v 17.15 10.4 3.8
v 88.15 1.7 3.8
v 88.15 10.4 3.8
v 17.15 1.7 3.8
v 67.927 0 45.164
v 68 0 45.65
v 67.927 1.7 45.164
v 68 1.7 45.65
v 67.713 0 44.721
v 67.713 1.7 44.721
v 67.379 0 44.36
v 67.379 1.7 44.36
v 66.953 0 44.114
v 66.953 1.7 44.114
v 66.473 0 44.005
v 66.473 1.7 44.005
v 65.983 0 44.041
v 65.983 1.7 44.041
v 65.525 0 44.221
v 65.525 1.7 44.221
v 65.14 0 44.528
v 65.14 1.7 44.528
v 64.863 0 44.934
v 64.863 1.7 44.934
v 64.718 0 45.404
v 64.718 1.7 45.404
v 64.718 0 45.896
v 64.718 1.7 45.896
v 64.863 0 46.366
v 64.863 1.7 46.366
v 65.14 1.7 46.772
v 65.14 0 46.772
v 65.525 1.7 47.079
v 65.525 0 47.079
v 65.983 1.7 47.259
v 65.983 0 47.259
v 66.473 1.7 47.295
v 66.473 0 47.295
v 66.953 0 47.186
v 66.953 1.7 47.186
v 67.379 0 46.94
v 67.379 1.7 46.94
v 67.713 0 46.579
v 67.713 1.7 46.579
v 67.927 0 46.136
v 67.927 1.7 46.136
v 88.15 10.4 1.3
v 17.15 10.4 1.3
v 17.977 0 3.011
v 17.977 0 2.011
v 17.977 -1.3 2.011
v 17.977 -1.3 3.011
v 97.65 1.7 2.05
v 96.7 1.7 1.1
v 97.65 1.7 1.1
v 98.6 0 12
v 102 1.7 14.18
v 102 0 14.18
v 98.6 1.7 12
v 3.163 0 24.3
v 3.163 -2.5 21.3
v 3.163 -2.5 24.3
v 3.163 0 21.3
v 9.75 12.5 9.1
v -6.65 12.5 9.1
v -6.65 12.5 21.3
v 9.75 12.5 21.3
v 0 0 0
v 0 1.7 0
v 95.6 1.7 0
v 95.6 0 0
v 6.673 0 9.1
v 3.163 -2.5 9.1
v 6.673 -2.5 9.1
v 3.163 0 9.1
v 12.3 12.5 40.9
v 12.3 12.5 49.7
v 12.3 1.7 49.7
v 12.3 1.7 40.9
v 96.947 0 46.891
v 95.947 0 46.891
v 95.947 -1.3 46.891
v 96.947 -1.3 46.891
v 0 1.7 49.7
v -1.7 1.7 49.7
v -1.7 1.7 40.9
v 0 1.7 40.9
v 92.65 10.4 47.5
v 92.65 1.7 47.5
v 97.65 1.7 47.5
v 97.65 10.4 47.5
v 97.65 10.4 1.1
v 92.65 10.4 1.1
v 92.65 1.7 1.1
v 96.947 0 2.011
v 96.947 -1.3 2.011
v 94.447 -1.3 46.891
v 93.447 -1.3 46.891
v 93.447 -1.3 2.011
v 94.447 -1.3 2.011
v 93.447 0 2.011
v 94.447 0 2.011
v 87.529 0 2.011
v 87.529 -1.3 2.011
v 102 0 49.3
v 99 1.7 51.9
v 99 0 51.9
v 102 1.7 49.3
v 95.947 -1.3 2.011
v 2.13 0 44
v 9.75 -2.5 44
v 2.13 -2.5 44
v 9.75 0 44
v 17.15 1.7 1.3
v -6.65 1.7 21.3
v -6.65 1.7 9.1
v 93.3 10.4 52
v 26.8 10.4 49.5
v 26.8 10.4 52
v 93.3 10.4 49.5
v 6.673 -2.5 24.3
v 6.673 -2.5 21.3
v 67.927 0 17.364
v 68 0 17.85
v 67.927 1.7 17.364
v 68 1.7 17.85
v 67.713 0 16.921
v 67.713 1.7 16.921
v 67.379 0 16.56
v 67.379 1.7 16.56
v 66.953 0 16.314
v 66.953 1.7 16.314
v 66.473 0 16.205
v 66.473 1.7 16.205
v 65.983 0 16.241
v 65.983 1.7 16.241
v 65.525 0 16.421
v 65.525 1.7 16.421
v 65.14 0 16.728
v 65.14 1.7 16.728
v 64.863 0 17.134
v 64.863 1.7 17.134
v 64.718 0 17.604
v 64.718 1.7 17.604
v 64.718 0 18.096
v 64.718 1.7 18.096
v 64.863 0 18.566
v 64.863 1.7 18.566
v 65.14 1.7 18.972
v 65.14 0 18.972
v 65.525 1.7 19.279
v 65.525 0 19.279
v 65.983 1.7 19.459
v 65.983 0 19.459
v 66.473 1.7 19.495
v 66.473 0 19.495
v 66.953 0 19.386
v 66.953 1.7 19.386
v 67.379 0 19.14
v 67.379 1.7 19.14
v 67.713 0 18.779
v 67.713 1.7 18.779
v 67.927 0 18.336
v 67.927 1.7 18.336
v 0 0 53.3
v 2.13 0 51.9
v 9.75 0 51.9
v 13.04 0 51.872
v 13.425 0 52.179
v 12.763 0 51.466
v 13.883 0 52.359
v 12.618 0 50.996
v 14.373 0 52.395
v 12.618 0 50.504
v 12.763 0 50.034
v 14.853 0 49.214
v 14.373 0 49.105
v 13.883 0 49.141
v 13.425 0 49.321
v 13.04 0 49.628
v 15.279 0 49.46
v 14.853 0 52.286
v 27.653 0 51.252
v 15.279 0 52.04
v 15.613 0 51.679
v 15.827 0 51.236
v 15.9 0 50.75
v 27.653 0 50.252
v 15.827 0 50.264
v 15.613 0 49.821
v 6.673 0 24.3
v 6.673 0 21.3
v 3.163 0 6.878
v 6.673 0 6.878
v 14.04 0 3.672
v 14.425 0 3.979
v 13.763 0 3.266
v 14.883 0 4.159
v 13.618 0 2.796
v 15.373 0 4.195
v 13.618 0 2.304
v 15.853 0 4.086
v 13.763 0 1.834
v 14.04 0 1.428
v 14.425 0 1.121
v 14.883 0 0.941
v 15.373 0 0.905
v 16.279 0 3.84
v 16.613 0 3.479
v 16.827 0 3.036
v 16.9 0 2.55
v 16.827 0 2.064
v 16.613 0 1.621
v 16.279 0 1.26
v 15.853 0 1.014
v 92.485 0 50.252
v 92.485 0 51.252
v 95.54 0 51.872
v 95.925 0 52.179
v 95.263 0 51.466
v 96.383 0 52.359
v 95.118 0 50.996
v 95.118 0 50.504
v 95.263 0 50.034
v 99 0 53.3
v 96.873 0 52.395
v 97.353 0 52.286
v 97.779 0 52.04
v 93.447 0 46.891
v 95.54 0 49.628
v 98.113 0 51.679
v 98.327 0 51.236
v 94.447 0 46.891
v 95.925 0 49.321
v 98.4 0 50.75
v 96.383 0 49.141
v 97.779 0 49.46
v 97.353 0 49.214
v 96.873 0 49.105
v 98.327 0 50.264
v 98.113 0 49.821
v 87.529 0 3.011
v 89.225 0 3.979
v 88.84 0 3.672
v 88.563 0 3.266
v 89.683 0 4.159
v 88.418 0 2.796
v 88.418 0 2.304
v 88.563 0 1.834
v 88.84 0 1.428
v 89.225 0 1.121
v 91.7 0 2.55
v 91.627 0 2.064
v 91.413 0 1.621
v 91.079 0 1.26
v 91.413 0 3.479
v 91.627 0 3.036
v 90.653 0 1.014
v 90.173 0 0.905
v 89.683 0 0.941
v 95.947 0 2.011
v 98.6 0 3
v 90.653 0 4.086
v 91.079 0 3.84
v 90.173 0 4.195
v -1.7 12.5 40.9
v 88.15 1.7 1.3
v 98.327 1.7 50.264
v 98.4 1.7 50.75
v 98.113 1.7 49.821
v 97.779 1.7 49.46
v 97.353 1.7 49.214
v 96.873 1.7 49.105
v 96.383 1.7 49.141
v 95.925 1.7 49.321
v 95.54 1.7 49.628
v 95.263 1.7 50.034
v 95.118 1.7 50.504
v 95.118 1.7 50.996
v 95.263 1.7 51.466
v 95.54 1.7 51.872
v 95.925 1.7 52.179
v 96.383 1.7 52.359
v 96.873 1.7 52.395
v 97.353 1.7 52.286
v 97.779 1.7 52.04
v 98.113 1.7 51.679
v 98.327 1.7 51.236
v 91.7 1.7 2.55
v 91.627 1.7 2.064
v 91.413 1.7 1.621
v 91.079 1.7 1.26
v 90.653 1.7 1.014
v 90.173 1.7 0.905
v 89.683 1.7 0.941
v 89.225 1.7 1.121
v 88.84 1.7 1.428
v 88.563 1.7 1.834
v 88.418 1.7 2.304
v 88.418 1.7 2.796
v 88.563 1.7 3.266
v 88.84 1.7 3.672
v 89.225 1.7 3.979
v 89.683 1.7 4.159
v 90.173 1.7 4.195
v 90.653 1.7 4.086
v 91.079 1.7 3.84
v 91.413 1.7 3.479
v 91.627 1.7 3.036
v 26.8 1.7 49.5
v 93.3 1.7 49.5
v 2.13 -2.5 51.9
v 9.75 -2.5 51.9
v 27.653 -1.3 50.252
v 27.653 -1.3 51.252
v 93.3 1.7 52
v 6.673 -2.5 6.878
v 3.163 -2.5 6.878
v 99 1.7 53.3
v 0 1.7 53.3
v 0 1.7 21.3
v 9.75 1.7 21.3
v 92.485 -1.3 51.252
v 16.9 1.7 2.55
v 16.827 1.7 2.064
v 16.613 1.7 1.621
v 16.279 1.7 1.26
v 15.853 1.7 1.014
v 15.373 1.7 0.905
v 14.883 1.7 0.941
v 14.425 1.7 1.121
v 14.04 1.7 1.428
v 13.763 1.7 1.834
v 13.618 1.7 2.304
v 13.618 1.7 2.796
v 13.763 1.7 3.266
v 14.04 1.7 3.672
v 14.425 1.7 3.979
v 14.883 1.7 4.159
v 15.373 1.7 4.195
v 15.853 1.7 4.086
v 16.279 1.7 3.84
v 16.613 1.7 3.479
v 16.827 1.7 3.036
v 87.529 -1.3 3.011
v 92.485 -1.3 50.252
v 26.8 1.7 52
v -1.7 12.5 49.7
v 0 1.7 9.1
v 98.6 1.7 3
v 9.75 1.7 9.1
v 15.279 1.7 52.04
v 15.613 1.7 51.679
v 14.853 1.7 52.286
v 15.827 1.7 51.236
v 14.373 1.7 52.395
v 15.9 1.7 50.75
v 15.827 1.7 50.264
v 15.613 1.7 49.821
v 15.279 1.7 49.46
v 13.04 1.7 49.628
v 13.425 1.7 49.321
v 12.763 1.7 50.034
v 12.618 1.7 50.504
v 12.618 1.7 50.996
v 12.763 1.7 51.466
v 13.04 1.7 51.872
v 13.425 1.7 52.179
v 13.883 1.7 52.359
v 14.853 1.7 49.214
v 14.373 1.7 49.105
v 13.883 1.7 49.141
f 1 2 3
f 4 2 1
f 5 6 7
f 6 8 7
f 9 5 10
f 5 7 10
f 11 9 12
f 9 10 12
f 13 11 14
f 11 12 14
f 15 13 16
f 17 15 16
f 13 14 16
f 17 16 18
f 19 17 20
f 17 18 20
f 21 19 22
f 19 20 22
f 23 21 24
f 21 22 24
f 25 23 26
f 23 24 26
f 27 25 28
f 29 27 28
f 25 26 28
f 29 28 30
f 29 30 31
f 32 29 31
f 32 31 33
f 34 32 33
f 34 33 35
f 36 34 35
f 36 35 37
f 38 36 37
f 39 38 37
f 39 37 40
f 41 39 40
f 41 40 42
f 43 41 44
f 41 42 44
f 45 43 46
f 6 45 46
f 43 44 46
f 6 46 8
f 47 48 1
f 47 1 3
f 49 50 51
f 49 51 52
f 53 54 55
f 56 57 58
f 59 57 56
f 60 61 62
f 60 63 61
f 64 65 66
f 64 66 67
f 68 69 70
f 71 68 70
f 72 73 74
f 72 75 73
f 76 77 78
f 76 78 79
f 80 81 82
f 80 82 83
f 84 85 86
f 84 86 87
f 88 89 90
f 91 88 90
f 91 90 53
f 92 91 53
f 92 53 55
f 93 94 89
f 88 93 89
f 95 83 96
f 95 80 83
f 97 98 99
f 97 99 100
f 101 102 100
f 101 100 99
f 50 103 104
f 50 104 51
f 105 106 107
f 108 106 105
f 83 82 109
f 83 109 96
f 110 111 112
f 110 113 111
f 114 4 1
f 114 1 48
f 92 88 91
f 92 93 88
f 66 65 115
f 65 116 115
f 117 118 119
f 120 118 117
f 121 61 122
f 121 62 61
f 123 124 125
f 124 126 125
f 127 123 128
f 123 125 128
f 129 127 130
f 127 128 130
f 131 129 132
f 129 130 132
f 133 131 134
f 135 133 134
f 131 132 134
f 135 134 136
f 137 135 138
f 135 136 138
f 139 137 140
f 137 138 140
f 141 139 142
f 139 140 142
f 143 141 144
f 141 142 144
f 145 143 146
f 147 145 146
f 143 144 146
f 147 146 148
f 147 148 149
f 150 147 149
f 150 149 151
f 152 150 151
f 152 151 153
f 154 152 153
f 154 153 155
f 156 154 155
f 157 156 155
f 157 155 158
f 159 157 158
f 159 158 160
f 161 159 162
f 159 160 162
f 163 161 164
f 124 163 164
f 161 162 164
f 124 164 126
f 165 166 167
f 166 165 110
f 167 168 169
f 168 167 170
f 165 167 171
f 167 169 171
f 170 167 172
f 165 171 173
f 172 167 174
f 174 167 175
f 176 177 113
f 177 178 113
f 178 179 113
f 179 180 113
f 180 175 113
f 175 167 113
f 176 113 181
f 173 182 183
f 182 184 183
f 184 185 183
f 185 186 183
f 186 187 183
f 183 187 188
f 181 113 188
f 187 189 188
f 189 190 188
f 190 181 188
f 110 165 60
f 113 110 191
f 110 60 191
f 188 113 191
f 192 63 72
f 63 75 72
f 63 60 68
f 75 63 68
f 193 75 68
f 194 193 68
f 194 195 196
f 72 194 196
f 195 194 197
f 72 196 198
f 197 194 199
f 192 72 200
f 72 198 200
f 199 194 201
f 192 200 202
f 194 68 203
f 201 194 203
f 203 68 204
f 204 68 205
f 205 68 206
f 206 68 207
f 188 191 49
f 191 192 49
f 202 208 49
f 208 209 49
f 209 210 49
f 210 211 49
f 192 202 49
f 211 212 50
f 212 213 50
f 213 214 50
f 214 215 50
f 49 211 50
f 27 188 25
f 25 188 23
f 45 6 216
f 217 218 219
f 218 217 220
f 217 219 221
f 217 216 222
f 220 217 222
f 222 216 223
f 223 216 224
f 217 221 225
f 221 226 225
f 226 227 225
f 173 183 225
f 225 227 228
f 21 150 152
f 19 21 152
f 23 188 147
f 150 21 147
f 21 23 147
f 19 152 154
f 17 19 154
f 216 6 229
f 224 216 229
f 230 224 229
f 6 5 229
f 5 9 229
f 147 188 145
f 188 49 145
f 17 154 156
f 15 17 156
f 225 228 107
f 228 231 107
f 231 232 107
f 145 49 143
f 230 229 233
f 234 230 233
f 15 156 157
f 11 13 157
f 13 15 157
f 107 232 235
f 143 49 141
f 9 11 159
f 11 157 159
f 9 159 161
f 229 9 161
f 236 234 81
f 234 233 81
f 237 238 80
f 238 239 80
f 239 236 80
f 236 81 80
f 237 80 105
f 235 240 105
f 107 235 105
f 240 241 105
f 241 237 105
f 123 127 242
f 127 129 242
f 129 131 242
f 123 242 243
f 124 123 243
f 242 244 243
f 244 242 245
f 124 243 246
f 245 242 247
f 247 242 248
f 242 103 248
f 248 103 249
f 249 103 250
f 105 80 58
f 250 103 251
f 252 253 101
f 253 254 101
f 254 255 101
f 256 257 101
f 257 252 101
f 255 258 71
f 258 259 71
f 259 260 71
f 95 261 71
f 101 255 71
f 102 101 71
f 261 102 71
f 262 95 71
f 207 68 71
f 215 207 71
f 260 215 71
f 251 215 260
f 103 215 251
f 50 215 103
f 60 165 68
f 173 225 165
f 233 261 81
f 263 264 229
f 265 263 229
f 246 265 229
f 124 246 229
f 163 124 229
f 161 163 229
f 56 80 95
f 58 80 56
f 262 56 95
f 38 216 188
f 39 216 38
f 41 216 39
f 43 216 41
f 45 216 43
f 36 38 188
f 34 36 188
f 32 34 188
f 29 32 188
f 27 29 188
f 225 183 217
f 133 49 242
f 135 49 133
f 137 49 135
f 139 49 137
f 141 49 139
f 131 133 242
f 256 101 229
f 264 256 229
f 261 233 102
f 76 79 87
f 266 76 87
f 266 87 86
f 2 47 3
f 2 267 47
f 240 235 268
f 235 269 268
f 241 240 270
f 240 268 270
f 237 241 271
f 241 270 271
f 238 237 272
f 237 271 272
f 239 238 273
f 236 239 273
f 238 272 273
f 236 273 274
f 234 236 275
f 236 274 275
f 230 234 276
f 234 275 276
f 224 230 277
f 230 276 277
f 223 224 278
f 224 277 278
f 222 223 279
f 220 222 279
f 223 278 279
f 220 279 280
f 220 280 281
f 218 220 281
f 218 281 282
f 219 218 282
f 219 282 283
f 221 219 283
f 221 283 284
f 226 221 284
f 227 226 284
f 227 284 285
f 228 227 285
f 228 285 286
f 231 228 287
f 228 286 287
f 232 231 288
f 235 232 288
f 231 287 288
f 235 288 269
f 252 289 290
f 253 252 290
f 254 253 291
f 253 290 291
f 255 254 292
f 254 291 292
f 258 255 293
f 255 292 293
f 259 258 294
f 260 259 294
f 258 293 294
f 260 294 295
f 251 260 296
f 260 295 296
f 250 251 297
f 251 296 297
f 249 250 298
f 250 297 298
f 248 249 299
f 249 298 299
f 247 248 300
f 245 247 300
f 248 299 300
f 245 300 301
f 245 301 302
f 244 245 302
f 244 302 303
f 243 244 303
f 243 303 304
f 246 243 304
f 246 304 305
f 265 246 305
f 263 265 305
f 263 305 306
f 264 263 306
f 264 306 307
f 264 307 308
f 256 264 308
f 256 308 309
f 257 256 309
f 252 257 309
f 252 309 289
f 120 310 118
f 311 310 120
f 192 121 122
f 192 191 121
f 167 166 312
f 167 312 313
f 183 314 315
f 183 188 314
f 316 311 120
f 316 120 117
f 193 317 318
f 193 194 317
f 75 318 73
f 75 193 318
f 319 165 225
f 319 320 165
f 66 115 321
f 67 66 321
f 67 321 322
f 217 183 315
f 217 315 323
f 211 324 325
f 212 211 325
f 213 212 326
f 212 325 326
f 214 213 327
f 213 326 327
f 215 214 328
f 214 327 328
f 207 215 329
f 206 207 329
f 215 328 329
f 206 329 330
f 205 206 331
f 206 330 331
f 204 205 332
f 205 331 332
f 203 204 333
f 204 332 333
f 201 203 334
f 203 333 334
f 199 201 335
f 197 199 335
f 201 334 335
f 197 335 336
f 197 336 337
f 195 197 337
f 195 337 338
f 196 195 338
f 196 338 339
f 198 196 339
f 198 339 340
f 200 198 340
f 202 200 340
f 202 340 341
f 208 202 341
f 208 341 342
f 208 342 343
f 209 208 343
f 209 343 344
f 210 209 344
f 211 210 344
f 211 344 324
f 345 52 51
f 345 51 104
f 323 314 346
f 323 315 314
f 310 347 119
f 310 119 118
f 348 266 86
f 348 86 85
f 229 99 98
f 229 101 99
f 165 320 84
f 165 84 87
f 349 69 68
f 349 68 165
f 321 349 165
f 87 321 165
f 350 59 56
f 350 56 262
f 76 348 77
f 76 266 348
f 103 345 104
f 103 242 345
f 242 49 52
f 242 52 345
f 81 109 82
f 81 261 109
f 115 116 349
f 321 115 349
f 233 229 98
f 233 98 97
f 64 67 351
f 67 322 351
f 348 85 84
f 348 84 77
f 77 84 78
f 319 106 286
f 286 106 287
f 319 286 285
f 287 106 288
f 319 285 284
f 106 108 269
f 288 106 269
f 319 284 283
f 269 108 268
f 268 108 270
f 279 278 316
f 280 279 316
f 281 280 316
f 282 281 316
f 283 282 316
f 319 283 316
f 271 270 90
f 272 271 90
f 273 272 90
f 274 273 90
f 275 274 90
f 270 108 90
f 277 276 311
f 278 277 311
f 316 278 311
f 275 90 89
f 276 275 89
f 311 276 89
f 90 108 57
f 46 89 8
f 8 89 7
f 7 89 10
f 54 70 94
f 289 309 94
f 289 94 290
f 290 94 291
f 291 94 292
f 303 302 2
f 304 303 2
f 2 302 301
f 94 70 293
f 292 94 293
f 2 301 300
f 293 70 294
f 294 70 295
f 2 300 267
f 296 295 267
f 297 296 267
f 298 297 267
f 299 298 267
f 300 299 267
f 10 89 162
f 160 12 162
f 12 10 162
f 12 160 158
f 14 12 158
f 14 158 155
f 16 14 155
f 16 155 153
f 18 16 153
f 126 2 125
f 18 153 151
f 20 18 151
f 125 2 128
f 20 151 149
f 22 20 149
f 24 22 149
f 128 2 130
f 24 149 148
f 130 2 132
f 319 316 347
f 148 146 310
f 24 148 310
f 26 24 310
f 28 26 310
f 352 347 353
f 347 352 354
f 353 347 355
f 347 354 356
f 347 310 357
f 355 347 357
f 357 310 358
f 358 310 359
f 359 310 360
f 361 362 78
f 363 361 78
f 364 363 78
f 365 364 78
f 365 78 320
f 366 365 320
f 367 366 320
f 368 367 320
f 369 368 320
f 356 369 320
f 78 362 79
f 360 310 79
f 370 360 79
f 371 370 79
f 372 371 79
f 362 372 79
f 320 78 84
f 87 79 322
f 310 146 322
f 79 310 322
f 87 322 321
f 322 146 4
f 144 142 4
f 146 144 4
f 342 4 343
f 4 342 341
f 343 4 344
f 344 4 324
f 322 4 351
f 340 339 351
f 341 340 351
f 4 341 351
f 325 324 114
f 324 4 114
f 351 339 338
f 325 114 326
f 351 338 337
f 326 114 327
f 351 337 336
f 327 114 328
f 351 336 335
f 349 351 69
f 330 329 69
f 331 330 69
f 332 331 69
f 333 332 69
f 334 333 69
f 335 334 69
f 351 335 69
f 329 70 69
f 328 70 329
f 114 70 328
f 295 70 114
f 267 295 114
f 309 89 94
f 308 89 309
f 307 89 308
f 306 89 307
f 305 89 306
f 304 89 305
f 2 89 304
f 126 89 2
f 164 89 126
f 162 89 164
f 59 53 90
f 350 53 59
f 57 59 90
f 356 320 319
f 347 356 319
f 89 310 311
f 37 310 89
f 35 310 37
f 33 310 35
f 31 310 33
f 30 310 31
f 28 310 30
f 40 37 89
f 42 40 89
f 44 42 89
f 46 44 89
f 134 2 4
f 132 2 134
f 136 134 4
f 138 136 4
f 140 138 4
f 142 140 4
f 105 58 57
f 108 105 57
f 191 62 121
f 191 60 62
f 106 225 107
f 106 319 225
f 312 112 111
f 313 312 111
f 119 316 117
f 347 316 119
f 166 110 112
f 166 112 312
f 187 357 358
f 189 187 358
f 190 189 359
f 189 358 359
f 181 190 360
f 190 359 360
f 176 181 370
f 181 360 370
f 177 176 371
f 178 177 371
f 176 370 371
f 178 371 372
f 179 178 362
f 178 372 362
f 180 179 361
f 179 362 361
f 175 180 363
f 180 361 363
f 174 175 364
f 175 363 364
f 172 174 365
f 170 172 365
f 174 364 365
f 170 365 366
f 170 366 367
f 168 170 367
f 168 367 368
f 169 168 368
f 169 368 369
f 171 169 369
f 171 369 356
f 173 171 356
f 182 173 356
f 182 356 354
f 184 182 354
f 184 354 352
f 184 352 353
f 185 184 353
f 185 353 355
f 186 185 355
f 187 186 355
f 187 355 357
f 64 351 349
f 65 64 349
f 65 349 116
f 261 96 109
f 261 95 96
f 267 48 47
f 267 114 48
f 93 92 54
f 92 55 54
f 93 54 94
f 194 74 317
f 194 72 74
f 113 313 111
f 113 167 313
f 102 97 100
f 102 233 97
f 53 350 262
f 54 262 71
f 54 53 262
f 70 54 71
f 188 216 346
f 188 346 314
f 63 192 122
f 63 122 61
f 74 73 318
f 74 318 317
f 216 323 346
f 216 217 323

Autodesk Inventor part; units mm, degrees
ref_plane "YZ Plane" through (0, 0, 0) normal (1, 0, 0) x (0, 1, 0)
ref_plane "XZ Plane" through (0, 0, 0) normal (0, 1, 0) x (-1, 0, 0)
ref_plane "XY Plane" through (0, 0, 0) normal (0, 0, 1) x (1, 0, 0)
sketch "Sketch1" plane through (0, 0, 0) normal (0, 0, 1) x (1, 0, 0)
  line L0 (0, 0) -> (102, 0)
  line L1 (102, 0) -> (102, 1.7)
  line L2 (102, 1.7) -> (0, 1.7)
  line L3 (0, 1.7) -> (0, 0)
  dimension "d0" = 102
  dimension "d1" = 1.7
extrude "Extrusion1" add sketch "Sketch1" along normal blind 53.3
sketch "Sketch3" plane through (0, 1.7, 53.3) normal (0, 1, 0) x (1, 0, 0)
  line L0 (102, 53.3) -> (0, 53.3) projected
  line L1 (0, 53.3) -> (0, 0) projected
  line L2 (0, 0) -> (102, 0) projected
  line L3 (9.75, 44.2) -> (-6.65, 44.2)
  line L4 (-6.65, 44.2) -> (-6.65, 32)
  line L5 (-6.65, 32) -> (9.75, 32)
  line L6 (9.75, 32) -> (9.75, 44.2)
  line L7 (12.3, 12.4) -> (-1.7, 12.4)
  line L8 (-1.7, 12.4) -> (-1.7, 3.6)
  line L9 (-1.7, 3.6) -> (12.3, 3.6)
  line L10 (12.3, 3.6) -> (12.3, 12.4)
  line L11 (102, 0) -> (0, 0) projected
  line L12 (99, 0) -> (99, 1.4)
  line L13 (99, 1.4) -> (102, 4)
  line L14 (102, 4) -> (102, 39.12)
  line L15 (102, 53.3) -> (102, 0) projected
  line L16 (102, 39.12) -> (98.6, 41.3)
  line L17 (98.6, 41.3) -> (98.6, 50.3)
  line L18 (98.6, 50.3) -> (95.6, 53.3)
  line L19 (0, 53.3) -> (102, 53.3) projected
  circle A0 centre (96.75, 2.55) radius 1.65
  circle A1 centre (90.05, 50.75) radius 1.65
  circle A2 centre (66.35, 35.45) radius 1.65
  circle A3 centre (66.35, 7.65) radius 1.65
  circle A4 centre (15.25, 50.75) radius 1.65
  circle A5 centre (14.25, 2.55) radius 1.65
  line L20 (88.15, 49.5) -> (17.15, 49.5)
  line L21 (17.15, 49.5) -> (17.15, 52)
  line L22 (17.15, 52) -> (88.15, 52)
  line L23 (88.15, 52) -> (88.15, 49.5)
  line L24 (93.3, 1.3) -> (26.8, 1.3)
  line L25 (26.8, 1.3) -> (26.8, 3.8)
  line L26 (26.8, 3.8) -> (93.3, 3.8)
  line L27 (93.3, 3.8) -> (93.3, 1.3)
  line L28 (97.65, 52.2) -> (92.65, 52.2)
  line L29 (92.65, 52.2) -> (92.65, 5.8)
  line L30 (92.65, 5.8) -> (97.65, 5.8)
  line L31 (97.65, 5.8) -> (97.65, 52.2)
  dimension "d23" = 9.1
  dimension "d24" = 9.75
  dimension "d25" = 16.4
  dimension "d26" = 12.2
  dimension "d27" = 8.8
  dimension "d28" = 14
  dimension "d29" = 12.4
  dimension "d30" = 1.7
  dimension "d44" = 3
  dimension "d45" = 3.4
  dimension "d46" = 3
  dimension "d47" = 3
  dimension "d48" = 1.4
  dimension "d49" = 4
  dimension "d50" = 35.12
  dimension "d51" = 12
  dimension "d52" = 3.3
  dimension "d53" = 3.3
  dimension "d54" = 3.3
  dimension "d55" = 3.3
  dimension "d56" = 3.3
  dimension "d57" = 3.3
  dimension "d58" = 0.9
  dimension "d59" = 3.6
  dimension "d60" = 6.9
  dimension "d61" = 0.9
  dimension "d62" = 0.9
  dimension "d63" = 0.9
  dimension "d64" = 13.6
  dimension "d66" = 12.6
  dimension "d67" = 34
  dimension "d69" = 34
  dimension "d70" = 6
  dimension "d71" = 16.2
  dimension "d72" = 71
  dimension "d73" = 0.25
  dimension "d74" = 2.5
  dimension "d75" = 1.25
  dimension "d76" = 66.5
  dimension "d77" = 2.5
  dimension "d78" = 1.25
  dimension "d79" = 1.8
  dimension "d80" = 5
  dimension "d81" = 46.4
  dimension "d82" = 1.1
  dimension "d83" = 0.95
extrude "Extrusion3" add sketch "Sketch3" along normal blind 10.8 contours L3 L6 L5 L1 | L1 L5 L4 L3 | L7 L10 L9 L1 | L1 L9 L8 L7
extrude "Extrusion9" cut sketch "Sketch3" against normal blind 10 contours L15 L16 L17 L18 L31 L28 L0 | L28 L31 L18 | L15 L2 L12 L13 | A0 | A1 | A2 | A3 | A4 | A5
extrude "Extrusion10" add sketch "Sketch3" along normal blind 8.7 contours L28 L31 L18 | L18 L31 L30 L29 L28 | L20 L21 L22 L23 | L24 L25 L26 L27
sketch "Sketch7" plane through (0, 0, 0) normal (0, -1, 0) x (1, 0, 0)
  line L0 (26.8, 52) -> (26.8, 49.5) projected
  line L1 (93.3, 52) -> (26.8, 52) projected
  line L2 (93.3, 49.5) -> (93.3, 52) projected
  line L3 (26.8, 49.5) -> (93.3, 49.5) projected
  line L4 (17.15, 3.8) -> (17.15, 1.3) projected
  line L5 (88.15, 3.8) -> (17.15, 3.8) projected
  line L6 (88.15, 1.3) -> (88.15, 3.8) projected
  line L7 (17.15, 1.3) -> (88.15, 1.3) projected
  line L8 (97.65, 1.1) -> (97.65, 47.5) projected
  line L9 (92.65, 1.1) -> (97.65, 1.1) projected
  line L10 (92.65, 47.5) -> (92.65, 1.1) projected
  line L11 (97.65, 47.5) -> (92.65, 47.5) projected
  line L12 (87.5288, 2.0107) -> (17.9769, 2.0107)
  line L13 (17.9769, 2.0107) -> (17.9769, 3.0107)
  line L14 (17.9769, 3.0107) -> (87.5288, 3.0107)
  line L15 (87.5288, 3.0107) -> (87.5288, 2.0107)
  line L16 (92.4851, 50.2518) -> (27.6531, 50.2518)
  line L17 (27.6531, 50.2518) -> (27.6531, 51.2518)
  line L18 (27.6531, 51.2518) -> (92.4851, 51.2518)
  line L19 (92.4851, 51.2518) -> (92.4851, 50.2518)
  line L20 (96.9467, 2.0107) -> (95.9467, 2.0107)
  line L21 (95.9467, 2.0107) -> (95.9467, 46.8913)
  line L22 (95.9467, 46.8913) -> (96.9467, 46.8913)
  line L23 (96.9467, 46.8913) -> (96.9467, 2.0107)
  line L24 (93.4467, 46.8913) -> (94.4467, 46.8913)
  line L25 (94.4467, 46.8913) -> (94.4467, 2.0107)
  line L26 (94.4467, 2.0107) -> (93.4467, 2.0107)
  line L27 (93.4467, 2.0107) -> (93.4467, 46.8913)
  line L28 (12.3, 40.9) -> (12.3, 49.7) projected
  line L29 (-1.7, 40.9) -> (12.3, 40.9) projected
  line L30 (-1.7, 49.7) -> (-1.7, 40.9) projected
  line L31 (12.3, 49.7) -> (-1.7, 49.7) projected
  line L32 (9.75, 9.1) -> (9.75, 21.3) projected
  line L33 (-6.65, 9.1) -> (9.75, 9.1) projected
  line L34 (-6.65, 21.3) -> (-6.65, 9.1) projected
  line L35 (9.75, 21.3) -> (-6.65, 21.3) projected
  line L36 (0, 9.1) -> (9.75, 9.1) projected
  line L37 (6.6731, 6.8776) -> (3.1632, 6.8776)
  line L38 (3.1632, 6.8776) -> (3.1632, 9.1)
  line L39 (3.1632, 9.1) -> (6.6731, 9.1)
  line L40 (6.6731, 9.1) -> (6.6731, 6.8776)
  line L41 (9.75, 21.3) -> (0, 21.3) projected
  line L42 (6.6731, 21.3) -> (3.1632, 21.3)
  line L43 (3.1632, 21.3) -> (3.1632, 24.3)
  line L44 (3.1632, 24.3) -> (6.6731, 24.3)
  line L45 (6.6731, 24.3) -> (6.6731, 21.3)
  line L46 (9.75, 44) -> (2.1298, 44)
  line L47 (2.1298, 44) -> (2.1298, 51.9)
  line L48 (2.1298, 51.9) -> (9.75, 51.9)
  line L49 (9.75, 51.9) -> (9.75, 44)
  dimension "d110" = 1
  dimension "d111" = 1
  dimension "d112" = 1
  dimension "d113" = 1.5
  dimension "d114" = 1
extrude "Extrusion12" add sketch "Sketch7" along normal blind 1.3 contours L12 L13 L14 L15 | L16 L17 L18 L19 | L20 L21 L22 L23 | L24 L25 L26 L27
extrude "Extrusion13" add sketch "Sketch7" along normal blind 2.5 contours L49 L46 L47 L31 | L31 L47 L48 L49 | L40 L37 L38 L33 | L35 L43 L44 L45
properties part number "Arduino"
